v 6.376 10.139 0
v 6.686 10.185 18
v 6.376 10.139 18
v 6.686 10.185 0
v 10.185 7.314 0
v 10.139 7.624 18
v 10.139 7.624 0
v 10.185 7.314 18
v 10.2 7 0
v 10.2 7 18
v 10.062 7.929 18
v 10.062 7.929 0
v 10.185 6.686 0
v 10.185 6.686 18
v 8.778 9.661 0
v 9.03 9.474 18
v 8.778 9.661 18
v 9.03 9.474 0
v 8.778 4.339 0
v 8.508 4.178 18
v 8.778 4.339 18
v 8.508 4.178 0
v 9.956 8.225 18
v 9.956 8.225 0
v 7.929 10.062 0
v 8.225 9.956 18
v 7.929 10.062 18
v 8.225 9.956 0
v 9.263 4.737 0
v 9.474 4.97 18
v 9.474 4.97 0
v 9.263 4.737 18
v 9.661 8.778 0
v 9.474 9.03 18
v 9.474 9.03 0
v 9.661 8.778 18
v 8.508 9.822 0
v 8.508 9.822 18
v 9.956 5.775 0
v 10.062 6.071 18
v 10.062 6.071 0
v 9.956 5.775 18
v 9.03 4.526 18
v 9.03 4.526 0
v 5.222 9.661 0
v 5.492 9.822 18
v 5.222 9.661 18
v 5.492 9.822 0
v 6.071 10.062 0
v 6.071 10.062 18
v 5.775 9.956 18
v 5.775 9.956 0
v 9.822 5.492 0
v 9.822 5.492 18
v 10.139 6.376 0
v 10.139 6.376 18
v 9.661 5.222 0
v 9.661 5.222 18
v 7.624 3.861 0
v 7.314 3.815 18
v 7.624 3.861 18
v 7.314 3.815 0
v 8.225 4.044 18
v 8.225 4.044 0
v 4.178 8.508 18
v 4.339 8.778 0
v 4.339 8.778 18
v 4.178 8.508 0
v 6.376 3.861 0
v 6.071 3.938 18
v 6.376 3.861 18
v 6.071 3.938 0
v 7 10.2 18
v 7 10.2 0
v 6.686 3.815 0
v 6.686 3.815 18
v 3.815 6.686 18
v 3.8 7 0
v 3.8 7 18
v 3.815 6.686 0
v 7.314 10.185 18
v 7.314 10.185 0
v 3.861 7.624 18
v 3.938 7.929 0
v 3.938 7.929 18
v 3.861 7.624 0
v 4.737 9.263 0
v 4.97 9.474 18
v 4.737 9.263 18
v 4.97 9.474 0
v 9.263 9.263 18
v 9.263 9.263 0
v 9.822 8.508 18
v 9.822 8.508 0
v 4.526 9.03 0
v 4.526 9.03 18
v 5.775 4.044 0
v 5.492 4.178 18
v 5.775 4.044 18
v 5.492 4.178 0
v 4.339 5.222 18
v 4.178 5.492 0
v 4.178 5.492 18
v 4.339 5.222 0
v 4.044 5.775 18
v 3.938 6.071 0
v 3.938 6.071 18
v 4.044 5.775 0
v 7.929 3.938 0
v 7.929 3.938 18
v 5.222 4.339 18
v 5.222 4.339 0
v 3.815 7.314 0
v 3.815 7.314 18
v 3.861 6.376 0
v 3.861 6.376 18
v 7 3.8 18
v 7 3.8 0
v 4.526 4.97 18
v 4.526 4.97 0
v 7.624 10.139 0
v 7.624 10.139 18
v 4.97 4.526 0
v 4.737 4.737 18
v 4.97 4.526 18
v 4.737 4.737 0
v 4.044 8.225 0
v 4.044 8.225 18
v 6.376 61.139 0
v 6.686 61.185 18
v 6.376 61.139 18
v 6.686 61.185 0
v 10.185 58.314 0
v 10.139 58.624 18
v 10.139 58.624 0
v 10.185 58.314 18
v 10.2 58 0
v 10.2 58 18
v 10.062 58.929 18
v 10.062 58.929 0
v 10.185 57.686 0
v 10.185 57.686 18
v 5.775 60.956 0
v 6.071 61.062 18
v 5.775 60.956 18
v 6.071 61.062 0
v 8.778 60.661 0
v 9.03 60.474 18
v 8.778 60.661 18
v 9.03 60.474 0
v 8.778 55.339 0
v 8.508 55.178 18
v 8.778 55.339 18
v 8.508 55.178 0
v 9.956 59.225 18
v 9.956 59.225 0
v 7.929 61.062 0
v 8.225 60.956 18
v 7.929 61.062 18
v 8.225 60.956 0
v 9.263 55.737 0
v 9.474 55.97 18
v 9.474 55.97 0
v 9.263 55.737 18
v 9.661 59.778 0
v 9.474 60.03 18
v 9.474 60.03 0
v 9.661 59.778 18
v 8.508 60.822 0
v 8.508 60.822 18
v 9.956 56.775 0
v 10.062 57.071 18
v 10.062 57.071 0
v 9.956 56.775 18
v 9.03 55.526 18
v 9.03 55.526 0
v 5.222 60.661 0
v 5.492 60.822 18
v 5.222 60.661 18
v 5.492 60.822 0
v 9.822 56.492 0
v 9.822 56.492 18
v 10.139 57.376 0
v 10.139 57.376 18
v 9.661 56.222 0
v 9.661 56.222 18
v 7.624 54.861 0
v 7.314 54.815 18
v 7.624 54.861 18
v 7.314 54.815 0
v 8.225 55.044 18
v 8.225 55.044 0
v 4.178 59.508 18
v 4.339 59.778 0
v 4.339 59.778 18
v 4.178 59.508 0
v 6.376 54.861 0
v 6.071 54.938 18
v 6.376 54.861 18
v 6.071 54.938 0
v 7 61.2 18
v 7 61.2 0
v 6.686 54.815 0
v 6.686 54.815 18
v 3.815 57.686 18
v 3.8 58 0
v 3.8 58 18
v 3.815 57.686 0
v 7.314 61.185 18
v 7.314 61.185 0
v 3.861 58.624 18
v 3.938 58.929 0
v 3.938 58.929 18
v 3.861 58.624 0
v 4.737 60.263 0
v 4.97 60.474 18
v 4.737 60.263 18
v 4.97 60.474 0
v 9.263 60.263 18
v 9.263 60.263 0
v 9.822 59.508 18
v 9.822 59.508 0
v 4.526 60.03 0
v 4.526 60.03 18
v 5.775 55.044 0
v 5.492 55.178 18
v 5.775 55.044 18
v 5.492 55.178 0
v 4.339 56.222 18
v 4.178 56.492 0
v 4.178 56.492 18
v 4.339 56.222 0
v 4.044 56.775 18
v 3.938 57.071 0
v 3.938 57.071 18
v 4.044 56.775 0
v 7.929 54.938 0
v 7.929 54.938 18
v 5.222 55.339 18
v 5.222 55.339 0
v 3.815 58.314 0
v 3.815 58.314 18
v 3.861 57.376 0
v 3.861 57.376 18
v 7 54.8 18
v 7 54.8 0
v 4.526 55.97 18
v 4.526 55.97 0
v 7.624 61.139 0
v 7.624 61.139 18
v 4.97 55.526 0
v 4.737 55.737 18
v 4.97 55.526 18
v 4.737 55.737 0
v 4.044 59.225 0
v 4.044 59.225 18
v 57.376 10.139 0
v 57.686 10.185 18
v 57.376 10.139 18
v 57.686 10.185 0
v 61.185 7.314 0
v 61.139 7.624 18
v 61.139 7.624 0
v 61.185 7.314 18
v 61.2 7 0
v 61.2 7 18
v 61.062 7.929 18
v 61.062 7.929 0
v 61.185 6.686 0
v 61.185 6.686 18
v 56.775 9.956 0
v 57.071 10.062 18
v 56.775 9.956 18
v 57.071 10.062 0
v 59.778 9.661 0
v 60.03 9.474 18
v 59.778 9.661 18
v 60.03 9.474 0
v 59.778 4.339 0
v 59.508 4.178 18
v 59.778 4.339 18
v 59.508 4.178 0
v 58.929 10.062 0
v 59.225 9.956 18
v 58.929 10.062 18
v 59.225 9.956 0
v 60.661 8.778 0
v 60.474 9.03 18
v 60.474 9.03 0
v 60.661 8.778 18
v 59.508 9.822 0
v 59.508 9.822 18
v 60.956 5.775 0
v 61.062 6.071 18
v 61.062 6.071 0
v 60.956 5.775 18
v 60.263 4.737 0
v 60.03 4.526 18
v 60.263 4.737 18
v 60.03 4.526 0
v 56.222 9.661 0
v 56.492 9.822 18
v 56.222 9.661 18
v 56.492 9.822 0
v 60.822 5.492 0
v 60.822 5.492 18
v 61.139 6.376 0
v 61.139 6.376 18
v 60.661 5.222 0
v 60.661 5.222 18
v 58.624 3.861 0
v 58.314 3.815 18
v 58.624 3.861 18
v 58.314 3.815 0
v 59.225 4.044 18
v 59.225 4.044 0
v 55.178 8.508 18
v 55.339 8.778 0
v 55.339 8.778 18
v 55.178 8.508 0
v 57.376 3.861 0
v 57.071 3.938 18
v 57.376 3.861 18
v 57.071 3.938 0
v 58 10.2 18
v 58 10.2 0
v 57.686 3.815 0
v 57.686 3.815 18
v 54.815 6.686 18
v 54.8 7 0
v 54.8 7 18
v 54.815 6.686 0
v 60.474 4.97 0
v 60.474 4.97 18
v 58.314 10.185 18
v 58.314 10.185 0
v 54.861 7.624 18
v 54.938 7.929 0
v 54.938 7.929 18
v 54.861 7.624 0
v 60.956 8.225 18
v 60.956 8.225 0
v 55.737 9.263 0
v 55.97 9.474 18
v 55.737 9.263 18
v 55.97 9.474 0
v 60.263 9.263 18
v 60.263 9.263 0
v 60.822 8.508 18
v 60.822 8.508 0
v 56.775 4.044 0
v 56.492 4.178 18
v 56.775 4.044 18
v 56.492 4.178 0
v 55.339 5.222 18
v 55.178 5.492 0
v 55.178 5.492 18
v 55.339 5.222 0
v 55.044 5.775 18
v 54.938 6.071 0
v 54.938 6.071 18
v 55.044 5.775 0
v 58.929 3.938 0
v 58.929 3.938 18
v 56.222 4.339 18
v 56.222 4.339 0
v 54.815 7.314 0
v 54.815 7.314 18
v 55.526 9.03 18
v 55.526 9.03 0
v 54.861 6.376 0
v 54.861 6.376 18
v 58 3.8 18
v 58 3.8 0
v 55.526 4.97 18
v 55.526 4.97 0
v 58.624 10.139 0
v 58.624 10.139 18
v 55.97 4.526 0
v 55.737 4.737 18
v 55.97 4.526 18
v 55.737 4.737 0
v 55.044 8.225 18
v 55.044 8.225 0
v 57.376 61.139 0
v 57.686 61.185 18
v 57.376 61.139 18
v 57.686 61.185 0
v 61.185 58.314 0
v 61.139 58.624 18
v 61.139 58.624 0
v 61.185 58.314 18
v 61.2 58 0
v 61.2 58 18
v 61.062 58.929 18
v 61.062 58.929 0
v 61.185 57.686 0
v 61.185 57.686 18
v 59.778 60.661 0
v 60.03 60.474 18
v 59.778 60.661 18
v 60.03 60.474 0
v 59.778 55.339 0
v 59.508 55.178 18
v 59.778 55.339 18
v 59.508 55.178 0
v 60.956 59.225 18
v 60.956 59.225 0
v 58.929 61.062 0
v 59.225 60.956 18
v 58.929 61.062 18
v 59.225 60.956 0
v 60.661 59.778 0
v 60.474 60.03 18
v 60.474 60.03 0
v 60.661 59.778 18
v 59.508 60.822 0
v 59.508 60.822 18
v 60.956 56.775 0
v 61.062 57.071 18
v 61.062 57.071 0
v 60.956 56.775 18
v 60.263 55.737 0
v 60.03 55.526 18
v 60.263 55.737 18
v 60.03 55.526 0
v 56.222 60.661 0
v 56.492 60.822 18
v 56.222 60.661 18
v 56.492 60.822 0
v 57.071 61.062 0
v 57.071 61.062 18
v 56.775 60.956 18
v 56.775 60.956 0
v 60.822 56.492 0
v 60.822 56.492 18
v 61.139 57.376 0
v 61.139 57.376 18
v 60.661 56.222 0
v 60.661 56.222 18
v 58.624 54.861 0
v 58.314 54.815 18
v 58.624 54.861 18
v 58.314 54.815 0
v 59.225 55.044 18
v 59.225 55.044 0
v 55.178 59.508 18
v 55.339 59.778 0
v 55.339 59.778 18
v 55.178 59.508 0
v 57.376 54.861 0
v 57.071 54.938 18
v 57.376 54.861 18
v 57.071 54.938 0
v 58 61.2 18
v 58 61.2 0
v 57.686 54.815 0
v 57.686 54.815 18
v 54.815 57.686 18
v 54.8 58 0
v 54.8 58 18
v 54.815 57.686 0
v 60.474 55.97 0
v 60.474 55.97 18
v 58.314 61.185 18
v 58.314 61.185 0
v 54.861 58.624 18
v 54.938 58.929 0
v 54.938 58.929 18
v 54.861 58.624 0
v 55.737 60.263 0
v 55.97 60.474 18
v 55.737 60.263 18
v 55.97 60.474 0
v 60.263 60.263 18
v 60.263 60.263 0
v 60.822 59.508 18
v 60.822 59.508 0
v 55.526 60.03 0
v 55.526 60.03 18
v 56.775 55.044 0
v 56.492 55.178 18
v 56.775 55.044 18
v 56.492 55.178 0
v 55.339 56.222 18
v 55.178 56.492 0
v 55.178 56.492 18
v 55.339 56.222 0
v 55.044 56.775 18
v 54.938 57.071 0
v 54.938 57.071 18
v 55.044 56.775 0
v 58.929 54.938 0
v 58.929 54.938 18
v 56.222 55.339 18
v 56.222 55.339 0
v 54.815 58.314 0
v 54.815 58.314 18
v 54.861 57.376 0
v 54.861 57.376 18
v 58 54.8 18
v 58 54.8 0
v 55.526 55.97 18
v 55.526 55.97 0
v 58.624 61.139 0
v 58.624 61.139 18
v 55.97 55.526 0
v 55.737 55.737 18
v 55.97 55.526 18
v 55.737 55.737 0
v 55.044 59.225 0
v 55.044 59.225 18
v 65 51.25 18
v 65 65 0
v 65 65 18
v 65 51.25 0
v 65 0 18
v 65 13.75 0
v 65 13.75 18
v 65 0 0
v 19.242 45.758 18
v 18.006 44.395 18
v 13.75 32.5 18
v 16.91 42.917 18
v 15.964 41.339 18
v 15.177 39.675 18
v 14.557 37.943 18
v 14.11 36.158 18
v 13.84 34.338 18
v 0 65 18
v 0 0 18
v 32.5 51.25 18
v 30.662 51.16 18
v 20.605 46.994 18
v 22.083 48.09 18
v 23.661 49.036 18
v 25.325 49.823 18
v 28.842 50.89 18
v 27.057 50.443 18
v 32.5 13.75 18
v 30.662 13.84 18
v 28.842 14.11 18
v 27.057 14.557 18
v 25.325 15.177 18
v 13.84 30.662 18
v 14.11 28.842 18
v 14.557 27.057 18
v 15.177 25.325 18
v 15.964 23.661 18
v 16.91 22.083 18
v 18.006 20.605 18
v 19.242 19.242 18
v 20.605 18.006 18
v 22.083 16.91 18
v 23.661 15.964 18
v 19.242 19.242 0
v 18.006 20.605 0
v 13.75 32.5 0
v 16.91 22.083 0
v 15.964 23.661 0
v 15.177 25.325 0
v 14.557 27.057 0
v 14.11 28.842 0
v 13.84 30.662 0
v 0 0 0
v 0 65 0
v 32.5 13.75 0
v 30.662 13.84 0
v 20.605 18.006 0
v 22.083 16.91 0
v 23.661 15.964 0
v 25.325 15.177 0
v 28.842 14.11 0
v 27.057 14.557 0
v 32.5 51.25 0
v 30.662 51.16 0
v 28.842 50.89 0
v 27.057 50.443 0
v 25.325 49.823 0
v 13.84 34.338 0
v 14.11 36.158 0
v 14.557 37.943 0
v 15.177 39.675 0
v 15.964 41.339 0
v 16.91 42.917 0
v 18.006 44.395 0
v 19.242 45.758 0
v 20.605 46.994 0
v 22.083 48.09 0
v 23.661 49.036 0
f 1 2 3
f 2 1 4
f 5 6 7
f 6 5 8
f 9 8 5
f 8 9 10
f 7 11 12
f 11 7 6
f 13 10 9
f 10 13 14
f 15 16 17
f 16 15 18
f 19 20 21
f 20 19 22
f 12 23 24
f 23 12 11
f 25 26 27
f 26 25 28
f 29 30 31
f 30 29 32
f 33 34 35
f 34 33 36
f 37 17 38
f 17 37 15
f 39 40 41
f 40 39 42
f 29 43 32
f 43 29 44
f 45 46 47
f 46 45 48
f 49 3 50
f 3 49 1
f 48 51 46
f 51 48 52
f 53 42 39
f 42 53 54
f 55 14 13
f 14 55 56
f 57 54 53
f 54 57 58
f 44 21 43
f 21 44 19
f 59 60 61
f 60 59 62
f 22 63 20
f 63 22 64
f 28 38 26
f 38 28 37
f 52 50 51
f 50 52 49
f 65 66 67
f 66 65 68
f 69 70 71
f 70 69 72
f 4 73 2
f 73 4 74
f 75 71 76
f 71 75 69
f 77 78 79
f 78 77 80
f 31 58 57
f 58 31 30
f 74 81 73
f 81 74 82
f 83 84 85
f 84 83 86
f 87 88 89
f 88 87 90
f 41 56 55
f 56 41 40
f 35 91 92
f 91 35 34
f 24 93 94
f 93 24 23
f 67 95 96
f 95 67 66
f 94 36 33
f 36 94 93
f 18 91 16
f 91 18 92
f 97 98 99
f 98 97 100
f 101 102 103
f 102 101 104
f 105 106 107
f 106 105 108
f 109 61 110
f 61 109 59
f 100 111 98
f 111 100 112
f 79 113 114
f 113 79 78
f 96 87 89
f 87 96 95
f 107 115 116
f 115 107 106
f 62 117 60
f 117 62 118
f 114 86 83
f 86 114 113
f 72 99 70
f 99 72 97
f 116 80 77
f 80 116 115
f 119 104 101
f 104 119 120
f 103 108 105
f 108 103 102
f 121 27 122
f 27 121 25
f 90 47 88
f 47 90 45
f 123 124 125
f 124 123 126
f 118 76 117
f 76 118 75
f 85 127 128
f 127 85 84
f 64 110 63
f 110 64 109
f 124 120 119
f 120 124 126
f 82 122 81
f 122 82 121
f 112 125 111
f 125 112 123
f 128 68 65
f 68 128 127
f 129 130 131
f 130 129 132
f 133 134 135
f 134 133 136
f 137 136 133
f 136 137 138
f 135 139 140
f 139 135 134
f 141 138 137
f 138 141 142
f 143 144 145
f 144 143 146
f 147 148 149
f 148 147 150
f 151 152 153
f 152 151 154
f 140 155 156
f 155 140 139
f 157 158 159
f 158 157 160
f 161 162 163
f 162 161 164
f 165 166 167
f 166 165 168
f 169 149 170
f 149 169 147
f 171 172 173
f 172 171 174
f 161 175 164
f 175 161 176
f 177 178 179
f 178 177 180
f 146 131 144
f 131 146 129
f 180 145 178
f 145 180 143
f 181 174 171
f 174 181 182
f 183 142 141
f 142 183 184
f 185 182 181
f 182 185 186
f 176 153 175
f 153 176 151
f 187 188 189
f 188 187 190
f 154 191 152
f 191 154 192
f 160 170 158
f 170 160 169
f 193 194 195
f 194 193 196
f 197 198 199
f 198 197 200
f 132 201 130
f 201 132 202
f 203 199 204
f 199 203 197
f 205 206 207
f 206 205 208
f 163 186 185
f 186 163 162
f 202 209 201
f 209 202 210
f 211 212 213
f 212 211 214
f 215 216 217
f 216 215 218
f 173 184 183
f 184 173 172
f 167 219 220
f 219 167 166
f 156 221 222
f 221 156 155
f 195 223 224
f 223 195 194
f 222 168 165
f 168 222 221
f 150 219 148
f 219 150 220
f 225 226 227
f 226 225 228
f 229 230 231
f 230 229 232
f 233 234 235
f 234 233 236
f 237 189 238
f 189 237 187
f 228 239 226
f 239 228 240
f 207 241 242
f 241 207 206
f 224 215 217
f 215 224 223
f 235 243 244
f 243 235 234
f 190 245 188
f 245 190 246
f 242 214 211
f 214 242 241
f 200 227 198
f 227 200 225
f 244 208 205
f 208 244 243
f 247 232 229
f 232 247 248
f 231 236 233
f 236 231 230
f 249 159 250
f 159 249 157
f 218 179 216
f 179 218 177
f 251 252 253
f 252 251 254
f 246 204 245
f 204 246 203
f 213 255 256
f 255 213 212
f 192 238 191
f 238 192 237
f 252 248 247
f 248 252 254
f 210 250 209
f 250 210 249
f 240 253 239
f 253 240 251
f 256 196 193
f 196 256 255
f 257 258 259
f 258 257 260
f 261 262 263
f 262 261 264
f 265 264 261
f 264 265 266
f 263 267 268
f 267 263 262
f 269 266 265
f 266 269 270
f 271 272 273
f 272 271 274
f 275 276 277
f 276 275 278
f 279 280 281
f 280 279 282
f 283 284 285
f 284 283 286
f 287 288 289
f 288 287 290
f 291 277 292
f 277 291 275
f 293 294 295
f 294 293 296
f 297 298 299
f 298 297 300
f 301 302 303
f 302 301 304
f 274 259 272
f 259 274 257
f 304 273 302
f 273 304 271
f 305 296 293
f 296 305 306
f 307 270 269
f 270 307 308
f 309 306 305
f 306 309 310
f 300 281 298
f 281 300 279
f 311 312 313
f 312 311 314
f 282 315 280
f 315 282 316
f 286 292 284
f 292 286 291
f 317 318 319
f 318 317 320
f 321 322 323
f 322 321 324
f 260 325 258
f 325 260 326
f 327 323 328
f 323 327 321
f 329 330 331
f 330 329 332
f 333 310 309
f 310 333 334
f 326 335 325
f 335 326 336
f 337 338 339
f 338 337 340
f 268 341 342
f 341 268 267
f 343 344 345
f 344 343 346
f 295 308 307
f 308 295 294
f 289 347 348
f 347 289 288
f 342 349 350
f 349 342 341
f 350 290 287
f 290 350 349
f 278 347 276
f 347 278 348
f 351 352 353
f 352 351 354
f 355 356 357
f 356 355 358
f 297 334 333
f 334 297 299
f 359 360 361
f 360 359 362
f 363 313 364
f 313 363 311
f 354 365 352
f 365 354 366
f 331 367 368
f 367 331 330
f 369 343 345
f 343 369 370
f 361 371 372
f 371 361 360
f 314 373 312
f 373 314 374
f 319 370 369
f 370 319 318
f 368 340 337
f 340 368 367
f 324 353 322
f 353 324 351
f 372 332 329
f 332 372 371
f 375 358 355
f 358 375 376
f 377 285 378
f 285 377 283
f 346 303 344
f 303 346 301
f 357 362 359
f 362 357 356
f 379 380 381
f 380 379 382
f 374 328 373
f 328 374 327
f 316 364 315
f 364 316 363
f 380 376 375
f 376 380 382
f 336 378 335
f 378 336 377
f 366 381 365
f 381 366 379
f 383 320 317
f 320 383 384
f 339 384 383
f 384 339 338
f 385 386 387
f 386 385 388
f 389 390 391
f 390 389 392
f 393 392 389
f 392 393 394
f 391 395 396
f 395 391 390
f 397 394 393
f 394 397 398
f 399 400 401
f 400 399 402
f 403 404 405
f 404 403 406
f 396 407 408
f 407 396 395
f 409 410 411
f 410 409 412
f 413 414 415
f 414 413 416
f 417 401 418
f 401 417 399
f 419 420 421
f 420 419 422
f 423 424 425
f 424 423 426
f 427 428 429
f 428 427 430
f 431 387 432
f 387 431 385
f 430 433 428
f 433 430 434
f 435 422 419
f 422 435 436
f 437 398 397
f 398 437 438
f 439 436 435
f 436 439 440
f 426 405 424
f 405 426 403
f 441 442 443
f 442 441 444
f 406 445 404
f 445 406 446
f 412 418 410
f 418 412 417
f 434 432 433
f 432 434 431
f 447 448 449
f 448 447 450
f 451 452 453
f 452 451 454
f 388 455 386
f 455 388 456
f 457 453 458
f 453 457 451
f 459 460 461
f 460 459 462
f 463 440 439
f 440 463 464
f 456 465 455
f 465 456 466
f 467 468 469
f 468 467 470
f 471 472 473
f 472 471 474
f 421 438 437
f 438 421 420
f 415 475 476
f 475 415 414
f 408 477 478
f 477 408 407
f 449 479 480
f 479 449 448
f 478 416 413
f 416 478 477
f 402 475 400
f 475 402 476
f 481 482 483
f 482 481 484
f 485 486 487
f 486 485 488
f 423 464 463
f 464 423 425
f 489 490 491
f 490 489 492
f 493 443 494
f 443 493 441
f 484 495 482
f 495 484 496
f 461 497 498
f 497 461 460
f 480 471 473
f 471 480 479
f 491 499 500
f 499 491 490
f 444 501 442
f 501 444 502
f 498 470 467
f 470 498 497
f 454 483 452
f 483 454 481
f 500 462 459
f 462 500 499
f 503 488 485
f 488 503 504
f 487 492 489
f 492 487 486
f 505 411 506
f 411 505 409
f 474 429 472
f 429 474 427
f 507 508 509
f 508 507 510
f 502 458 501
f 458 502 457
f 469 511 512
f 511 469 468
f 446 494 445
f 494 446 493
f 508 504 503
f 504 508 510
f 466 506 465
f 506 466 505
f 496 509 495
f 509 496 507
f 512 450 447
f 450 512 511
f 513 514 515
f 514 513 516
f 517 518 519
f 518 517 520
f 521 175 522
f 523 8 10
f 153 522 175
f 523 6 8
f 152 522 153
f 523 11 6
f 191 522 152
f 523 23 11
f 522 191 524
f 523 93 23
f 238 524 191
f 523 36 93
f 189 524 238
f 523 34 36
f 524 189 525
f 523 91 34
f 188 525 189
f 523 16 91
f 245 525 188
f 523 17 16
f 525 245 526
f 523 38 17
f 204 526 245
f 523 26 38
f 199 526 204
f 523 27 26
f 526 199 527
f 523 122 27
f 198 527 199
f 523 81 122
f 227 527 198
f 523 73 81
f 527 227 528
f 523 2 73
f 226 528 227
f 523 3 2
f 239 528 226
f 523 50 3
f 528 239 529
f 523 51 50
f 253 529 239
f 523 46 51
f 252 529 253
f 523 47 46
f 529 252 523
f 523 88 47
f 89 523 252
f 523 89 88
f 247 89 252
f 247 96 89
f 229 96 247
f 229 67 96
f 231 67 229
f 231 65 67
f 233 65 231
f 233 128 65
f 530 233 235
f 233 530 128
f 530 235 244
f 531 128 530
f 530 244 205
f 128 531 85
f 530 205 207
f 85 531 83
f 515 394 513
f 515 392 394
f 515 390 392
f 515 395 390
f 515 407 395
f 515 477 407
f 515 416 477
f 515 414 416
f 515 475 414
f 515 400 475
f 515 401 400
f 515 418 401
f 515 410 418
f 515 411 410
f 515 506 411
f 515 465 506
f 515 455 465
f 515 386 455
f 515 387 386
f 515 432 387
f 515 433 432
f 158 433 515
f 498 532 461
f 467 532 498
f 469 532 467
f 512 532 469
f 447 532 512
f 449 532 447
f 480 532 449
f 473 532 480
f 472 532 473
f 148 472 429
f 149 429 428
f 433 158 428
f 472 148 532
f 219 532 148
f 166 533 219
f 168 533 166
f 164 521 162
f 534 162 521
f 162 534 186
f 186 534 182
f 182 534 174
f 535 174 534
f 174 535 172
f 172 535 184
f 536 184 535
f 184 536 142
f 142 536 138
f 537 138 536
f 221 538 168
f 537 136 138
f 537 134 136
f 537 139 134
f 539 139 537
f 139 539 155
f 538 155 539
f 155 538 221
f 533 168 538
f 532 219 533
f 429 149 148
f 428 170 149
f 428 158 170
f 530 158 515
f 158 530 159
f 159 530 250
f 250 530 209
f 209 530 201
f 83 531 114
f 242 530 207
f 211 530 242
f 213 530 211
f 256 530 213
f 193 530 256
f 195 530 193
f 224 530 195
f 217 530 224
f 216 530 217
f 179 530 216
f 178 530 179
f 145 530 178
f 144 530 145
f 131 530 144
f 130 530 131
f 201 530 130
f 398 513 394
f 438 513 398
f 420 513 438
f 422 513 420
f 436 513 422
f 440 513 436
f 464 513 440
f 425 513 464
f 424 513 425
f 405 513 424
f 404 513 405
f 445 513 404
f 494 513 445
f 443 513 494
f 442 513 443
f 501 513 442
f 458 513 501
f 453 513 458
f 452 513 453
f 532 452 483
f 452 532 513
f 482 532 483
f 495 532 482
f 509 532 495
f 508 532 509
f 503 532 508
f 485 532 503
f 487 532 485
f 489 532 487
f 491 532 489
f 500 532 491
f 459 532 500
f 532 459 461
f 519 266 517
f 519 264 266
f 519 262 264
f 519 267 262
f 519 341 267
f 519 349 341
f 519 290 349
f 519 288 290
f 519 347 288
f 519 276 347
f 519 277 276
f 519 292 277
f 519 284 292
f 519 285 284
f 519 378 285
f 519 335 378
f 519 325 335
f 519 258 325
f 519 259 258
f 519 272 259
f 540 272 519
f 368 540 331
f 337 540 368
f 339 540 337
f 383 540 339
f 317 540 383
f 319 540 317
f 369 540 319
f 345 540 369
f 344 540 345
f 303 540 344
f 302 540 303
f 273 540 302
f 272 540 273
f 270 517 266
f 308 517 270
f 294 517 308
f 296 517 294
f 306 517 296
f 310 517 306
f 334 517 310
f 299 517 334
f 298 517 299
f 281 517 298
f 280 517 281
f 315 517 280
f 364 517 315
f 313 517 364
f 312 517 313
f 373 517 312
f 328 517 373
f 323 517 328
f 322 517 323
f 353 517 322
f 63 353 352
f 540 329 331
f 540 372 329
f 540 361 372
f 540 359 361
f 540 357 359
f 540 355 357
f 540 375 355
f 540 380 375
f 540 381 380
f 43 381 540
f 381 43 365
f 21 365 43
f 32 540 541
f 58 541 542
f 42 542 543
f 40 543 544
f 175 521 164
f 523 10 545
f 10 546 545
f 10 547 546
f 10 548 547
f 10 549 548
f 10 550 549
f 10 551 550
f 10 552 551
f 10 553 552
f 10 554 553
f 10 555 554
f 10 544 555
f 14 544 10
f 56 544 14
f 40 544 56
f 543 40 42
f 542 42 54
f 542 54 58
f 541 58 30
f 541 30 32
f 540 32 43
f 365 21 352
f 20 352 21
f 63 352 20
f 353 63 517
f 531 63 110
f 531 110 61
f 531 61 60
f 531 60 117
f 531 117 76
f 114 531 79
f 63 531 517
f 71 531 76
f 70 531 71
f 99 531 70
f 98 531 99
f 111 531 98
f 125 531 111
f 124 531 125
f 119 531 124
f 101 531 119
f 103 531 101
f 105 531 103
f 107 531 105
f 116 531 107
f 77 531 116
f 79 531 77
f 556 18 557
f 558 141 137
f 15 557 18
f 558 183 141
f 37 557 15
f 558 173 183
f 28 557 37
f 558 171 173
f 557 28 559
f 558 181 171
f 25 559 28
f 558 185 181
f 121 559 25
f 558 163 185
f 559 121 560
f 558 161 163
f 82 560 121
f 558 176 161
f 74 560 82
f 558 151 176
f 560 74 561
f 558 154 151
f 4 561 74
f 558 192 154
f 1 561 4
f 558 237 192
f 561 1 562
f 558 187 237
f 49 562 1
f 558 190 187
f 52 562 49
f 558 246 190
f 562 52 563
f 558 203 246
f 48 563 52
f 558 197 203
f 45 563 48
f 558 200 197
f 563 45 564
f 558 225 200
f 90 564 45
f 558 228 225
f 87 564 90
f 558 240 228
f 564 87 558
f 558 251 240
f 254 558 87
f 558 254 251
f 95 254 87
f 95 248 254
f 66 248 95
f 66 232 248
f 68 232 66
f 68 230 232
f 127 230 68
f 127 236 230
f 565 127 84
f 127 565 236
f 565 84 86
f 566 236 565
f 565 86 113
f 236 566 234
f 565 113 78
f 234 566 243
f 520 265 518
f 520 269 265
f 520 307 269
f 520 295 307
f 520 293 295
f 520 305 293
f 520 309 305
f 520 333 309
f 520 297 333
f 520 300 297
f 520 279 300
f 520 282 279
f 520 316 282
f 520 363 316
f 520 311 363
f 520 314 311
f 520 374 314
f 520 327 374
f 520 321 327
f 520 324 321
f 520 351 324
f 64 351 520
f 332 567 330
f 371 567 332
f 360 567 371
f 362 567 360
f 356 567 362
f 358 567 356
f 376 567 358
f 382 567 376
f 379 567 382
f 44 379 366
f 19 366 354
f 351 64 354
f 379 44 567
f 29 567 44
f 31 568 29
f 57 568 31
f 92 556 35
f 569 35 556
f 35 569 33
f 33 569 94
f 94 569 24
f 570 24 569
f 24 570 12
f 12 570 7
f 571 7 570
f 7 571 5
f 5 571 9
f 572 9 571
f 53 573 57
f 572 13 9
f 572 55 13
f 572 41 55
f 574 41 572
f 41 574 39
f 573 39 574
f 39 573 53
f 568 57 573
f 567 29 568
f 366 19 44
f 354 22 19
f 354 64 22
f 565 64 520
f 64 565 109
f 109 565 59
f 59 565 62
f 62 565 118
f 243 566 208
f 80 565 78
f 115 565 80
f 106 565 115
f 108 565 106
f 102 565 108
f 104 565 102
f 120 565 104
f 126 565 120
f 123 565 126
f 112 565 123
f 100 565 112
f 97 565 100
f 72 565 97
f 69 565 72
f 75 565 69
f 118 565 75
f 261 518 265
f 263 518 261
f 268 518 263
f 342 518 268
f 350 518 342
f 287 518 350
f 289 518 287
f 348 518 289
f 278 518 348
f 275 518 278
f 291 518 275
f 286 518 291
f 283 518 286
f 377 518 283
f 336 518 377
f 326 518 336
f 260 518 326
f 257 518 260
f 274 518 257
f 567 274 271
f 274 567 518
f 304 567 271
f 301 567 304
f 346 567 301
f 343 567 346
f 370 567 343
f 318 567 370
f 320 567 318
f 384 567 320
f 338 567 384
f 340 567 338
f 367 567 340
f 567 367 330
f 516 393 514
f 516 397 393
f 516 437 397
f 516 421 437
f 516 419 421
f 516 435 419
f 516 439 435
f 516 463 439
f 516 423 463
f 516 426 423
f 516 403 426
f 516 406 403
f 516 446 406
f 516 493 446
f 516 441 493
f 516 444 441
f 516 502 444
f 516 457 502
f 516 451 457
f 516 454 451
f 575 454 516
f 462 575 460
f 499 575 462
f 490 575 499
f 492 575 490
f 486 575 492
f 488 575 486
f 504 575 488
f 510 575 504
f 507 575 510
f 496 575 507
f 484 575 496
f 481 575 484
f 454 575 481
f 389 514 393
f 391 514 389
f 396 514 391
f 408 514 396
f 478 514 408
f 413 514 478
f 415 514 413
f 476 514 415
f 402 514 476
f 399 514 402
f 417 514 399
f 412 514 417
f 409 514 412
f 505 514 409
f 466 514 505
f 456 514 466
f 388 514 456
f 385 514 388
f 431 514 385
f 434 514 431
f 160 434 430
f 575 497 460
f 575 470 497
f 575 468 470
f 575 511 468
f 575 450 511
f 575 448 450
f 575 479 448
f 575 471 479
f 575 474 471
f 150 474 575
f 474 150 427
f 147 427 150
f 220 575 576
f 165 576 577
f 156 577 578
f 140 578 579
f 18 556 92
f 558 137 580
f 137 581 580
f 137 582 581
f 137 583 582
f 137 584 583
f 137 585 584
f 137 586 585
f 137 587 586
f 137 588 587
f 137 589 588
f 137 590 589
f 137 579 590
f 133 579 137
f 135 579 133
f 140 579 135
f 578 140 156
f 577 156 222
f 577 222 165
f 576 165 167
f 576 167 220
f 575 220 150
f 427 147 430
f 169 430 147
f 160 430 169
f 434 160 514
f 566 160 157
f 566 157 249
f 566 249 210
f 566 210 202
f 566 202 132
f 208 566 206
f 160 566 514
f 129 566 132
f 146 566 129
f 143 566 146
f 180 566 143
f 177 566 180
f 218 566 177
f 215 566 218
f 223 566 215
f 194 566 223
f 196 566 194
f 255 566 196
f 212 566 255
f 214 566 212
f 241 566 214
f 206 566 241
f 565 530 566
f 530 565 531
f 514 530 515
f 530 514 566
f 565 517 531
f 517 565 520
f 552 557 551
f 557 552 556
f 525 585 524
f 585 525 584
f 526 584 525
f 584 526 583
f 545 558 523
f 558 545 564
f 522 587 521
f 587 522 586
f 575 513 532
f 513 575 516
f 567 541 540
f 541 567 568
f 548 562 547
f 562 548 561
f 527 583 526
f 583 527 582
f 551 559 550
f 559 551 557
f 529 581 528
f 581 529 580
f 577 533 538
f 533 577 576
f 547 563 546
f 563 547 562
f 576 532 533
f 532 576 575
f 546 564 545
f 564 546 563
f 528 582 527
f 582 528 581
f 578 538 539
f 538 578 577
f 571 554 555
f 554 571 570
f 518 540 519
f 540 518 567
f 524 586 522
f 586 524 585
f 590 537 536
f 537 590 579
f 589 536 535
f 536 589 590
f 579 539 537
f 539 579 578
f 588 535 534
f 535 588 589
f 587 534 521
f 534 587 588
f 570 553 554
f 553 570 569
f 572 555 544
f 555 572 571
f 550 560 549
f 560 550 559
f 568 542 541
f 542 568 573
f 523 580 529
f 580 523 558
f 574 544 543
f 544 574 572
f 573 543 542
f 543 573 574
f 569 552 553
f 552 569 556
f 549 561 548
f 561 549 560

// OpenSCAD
run = 1;
$fn = 64;
//how wide and tall the mount is (is square)
c_width = 65;
//how thick it is
c_thickness = 18;
//diameter of what is going into it
c_tube_dia = 37.5;
//how deep it will go in
c_tube_depth = 19;

//cutout to the top
c_drop_in = true;
//put 4x screw holes
c_mounting_screws = true;
//size of screws
c_mounting_screw_size = 6.4;
c_mounting_screw_offset = 7;

module create_base() {
    cube([c_width, c_width, c_thickness]);
}


module remove_tube() {
    if (c_drop_in == true) {
        translate([c_width / 2, c_width / 2, c_thickness - c_tube_depth])
        hull() {
            cylinder(h=c_tube_depth+1, r=c_tube_dia / 2);
            translate([c_width / 2, 0, 0]) {
                cylinder(h=c_tube_depth+1, r=c_tube_dia / 2);
            }
        }

    } else {
        translate([c_width / 2, c_width / 2, c_thickness - c_tube_depth])
            cylinder(h=c_tube_depth+1, r=c_tube_dia / 2);
    }
}


module remove_screws() {
    translate([c_mounting_screw_offset, c_mounting_screw_offset, -1]) {
        cylinder(h = c_thickness + 2, r = c_mounting_screw_size / 2);
    }
    translate([c_mounting_screw_offset, c_width - c_mounting_screw_offset, -1]) {
        cylinder(h = c_thickness + 2, r = c_mounting_screw_size / 2);
    }
    translate([c_width - c_mounting_screw_offset, c_mounting_screw_offset, -1]) {
        cylinder(h = c_thickness + 2, r = c_mounting_screw_size / 2);
    }
    translate([c_width - c_mounting_screw_offset, c_width - c_mounting_screw_offset, -1]) {
        cylinder(h = c_thickness + 2, r = c_mounting_screw_size / 2);
    }
}

if (run == 1) {
    difference() {
        create_base();
        remove_tube();
        if (c_mounting_screws == true) {
            remove_screws();
        }
    }
}
